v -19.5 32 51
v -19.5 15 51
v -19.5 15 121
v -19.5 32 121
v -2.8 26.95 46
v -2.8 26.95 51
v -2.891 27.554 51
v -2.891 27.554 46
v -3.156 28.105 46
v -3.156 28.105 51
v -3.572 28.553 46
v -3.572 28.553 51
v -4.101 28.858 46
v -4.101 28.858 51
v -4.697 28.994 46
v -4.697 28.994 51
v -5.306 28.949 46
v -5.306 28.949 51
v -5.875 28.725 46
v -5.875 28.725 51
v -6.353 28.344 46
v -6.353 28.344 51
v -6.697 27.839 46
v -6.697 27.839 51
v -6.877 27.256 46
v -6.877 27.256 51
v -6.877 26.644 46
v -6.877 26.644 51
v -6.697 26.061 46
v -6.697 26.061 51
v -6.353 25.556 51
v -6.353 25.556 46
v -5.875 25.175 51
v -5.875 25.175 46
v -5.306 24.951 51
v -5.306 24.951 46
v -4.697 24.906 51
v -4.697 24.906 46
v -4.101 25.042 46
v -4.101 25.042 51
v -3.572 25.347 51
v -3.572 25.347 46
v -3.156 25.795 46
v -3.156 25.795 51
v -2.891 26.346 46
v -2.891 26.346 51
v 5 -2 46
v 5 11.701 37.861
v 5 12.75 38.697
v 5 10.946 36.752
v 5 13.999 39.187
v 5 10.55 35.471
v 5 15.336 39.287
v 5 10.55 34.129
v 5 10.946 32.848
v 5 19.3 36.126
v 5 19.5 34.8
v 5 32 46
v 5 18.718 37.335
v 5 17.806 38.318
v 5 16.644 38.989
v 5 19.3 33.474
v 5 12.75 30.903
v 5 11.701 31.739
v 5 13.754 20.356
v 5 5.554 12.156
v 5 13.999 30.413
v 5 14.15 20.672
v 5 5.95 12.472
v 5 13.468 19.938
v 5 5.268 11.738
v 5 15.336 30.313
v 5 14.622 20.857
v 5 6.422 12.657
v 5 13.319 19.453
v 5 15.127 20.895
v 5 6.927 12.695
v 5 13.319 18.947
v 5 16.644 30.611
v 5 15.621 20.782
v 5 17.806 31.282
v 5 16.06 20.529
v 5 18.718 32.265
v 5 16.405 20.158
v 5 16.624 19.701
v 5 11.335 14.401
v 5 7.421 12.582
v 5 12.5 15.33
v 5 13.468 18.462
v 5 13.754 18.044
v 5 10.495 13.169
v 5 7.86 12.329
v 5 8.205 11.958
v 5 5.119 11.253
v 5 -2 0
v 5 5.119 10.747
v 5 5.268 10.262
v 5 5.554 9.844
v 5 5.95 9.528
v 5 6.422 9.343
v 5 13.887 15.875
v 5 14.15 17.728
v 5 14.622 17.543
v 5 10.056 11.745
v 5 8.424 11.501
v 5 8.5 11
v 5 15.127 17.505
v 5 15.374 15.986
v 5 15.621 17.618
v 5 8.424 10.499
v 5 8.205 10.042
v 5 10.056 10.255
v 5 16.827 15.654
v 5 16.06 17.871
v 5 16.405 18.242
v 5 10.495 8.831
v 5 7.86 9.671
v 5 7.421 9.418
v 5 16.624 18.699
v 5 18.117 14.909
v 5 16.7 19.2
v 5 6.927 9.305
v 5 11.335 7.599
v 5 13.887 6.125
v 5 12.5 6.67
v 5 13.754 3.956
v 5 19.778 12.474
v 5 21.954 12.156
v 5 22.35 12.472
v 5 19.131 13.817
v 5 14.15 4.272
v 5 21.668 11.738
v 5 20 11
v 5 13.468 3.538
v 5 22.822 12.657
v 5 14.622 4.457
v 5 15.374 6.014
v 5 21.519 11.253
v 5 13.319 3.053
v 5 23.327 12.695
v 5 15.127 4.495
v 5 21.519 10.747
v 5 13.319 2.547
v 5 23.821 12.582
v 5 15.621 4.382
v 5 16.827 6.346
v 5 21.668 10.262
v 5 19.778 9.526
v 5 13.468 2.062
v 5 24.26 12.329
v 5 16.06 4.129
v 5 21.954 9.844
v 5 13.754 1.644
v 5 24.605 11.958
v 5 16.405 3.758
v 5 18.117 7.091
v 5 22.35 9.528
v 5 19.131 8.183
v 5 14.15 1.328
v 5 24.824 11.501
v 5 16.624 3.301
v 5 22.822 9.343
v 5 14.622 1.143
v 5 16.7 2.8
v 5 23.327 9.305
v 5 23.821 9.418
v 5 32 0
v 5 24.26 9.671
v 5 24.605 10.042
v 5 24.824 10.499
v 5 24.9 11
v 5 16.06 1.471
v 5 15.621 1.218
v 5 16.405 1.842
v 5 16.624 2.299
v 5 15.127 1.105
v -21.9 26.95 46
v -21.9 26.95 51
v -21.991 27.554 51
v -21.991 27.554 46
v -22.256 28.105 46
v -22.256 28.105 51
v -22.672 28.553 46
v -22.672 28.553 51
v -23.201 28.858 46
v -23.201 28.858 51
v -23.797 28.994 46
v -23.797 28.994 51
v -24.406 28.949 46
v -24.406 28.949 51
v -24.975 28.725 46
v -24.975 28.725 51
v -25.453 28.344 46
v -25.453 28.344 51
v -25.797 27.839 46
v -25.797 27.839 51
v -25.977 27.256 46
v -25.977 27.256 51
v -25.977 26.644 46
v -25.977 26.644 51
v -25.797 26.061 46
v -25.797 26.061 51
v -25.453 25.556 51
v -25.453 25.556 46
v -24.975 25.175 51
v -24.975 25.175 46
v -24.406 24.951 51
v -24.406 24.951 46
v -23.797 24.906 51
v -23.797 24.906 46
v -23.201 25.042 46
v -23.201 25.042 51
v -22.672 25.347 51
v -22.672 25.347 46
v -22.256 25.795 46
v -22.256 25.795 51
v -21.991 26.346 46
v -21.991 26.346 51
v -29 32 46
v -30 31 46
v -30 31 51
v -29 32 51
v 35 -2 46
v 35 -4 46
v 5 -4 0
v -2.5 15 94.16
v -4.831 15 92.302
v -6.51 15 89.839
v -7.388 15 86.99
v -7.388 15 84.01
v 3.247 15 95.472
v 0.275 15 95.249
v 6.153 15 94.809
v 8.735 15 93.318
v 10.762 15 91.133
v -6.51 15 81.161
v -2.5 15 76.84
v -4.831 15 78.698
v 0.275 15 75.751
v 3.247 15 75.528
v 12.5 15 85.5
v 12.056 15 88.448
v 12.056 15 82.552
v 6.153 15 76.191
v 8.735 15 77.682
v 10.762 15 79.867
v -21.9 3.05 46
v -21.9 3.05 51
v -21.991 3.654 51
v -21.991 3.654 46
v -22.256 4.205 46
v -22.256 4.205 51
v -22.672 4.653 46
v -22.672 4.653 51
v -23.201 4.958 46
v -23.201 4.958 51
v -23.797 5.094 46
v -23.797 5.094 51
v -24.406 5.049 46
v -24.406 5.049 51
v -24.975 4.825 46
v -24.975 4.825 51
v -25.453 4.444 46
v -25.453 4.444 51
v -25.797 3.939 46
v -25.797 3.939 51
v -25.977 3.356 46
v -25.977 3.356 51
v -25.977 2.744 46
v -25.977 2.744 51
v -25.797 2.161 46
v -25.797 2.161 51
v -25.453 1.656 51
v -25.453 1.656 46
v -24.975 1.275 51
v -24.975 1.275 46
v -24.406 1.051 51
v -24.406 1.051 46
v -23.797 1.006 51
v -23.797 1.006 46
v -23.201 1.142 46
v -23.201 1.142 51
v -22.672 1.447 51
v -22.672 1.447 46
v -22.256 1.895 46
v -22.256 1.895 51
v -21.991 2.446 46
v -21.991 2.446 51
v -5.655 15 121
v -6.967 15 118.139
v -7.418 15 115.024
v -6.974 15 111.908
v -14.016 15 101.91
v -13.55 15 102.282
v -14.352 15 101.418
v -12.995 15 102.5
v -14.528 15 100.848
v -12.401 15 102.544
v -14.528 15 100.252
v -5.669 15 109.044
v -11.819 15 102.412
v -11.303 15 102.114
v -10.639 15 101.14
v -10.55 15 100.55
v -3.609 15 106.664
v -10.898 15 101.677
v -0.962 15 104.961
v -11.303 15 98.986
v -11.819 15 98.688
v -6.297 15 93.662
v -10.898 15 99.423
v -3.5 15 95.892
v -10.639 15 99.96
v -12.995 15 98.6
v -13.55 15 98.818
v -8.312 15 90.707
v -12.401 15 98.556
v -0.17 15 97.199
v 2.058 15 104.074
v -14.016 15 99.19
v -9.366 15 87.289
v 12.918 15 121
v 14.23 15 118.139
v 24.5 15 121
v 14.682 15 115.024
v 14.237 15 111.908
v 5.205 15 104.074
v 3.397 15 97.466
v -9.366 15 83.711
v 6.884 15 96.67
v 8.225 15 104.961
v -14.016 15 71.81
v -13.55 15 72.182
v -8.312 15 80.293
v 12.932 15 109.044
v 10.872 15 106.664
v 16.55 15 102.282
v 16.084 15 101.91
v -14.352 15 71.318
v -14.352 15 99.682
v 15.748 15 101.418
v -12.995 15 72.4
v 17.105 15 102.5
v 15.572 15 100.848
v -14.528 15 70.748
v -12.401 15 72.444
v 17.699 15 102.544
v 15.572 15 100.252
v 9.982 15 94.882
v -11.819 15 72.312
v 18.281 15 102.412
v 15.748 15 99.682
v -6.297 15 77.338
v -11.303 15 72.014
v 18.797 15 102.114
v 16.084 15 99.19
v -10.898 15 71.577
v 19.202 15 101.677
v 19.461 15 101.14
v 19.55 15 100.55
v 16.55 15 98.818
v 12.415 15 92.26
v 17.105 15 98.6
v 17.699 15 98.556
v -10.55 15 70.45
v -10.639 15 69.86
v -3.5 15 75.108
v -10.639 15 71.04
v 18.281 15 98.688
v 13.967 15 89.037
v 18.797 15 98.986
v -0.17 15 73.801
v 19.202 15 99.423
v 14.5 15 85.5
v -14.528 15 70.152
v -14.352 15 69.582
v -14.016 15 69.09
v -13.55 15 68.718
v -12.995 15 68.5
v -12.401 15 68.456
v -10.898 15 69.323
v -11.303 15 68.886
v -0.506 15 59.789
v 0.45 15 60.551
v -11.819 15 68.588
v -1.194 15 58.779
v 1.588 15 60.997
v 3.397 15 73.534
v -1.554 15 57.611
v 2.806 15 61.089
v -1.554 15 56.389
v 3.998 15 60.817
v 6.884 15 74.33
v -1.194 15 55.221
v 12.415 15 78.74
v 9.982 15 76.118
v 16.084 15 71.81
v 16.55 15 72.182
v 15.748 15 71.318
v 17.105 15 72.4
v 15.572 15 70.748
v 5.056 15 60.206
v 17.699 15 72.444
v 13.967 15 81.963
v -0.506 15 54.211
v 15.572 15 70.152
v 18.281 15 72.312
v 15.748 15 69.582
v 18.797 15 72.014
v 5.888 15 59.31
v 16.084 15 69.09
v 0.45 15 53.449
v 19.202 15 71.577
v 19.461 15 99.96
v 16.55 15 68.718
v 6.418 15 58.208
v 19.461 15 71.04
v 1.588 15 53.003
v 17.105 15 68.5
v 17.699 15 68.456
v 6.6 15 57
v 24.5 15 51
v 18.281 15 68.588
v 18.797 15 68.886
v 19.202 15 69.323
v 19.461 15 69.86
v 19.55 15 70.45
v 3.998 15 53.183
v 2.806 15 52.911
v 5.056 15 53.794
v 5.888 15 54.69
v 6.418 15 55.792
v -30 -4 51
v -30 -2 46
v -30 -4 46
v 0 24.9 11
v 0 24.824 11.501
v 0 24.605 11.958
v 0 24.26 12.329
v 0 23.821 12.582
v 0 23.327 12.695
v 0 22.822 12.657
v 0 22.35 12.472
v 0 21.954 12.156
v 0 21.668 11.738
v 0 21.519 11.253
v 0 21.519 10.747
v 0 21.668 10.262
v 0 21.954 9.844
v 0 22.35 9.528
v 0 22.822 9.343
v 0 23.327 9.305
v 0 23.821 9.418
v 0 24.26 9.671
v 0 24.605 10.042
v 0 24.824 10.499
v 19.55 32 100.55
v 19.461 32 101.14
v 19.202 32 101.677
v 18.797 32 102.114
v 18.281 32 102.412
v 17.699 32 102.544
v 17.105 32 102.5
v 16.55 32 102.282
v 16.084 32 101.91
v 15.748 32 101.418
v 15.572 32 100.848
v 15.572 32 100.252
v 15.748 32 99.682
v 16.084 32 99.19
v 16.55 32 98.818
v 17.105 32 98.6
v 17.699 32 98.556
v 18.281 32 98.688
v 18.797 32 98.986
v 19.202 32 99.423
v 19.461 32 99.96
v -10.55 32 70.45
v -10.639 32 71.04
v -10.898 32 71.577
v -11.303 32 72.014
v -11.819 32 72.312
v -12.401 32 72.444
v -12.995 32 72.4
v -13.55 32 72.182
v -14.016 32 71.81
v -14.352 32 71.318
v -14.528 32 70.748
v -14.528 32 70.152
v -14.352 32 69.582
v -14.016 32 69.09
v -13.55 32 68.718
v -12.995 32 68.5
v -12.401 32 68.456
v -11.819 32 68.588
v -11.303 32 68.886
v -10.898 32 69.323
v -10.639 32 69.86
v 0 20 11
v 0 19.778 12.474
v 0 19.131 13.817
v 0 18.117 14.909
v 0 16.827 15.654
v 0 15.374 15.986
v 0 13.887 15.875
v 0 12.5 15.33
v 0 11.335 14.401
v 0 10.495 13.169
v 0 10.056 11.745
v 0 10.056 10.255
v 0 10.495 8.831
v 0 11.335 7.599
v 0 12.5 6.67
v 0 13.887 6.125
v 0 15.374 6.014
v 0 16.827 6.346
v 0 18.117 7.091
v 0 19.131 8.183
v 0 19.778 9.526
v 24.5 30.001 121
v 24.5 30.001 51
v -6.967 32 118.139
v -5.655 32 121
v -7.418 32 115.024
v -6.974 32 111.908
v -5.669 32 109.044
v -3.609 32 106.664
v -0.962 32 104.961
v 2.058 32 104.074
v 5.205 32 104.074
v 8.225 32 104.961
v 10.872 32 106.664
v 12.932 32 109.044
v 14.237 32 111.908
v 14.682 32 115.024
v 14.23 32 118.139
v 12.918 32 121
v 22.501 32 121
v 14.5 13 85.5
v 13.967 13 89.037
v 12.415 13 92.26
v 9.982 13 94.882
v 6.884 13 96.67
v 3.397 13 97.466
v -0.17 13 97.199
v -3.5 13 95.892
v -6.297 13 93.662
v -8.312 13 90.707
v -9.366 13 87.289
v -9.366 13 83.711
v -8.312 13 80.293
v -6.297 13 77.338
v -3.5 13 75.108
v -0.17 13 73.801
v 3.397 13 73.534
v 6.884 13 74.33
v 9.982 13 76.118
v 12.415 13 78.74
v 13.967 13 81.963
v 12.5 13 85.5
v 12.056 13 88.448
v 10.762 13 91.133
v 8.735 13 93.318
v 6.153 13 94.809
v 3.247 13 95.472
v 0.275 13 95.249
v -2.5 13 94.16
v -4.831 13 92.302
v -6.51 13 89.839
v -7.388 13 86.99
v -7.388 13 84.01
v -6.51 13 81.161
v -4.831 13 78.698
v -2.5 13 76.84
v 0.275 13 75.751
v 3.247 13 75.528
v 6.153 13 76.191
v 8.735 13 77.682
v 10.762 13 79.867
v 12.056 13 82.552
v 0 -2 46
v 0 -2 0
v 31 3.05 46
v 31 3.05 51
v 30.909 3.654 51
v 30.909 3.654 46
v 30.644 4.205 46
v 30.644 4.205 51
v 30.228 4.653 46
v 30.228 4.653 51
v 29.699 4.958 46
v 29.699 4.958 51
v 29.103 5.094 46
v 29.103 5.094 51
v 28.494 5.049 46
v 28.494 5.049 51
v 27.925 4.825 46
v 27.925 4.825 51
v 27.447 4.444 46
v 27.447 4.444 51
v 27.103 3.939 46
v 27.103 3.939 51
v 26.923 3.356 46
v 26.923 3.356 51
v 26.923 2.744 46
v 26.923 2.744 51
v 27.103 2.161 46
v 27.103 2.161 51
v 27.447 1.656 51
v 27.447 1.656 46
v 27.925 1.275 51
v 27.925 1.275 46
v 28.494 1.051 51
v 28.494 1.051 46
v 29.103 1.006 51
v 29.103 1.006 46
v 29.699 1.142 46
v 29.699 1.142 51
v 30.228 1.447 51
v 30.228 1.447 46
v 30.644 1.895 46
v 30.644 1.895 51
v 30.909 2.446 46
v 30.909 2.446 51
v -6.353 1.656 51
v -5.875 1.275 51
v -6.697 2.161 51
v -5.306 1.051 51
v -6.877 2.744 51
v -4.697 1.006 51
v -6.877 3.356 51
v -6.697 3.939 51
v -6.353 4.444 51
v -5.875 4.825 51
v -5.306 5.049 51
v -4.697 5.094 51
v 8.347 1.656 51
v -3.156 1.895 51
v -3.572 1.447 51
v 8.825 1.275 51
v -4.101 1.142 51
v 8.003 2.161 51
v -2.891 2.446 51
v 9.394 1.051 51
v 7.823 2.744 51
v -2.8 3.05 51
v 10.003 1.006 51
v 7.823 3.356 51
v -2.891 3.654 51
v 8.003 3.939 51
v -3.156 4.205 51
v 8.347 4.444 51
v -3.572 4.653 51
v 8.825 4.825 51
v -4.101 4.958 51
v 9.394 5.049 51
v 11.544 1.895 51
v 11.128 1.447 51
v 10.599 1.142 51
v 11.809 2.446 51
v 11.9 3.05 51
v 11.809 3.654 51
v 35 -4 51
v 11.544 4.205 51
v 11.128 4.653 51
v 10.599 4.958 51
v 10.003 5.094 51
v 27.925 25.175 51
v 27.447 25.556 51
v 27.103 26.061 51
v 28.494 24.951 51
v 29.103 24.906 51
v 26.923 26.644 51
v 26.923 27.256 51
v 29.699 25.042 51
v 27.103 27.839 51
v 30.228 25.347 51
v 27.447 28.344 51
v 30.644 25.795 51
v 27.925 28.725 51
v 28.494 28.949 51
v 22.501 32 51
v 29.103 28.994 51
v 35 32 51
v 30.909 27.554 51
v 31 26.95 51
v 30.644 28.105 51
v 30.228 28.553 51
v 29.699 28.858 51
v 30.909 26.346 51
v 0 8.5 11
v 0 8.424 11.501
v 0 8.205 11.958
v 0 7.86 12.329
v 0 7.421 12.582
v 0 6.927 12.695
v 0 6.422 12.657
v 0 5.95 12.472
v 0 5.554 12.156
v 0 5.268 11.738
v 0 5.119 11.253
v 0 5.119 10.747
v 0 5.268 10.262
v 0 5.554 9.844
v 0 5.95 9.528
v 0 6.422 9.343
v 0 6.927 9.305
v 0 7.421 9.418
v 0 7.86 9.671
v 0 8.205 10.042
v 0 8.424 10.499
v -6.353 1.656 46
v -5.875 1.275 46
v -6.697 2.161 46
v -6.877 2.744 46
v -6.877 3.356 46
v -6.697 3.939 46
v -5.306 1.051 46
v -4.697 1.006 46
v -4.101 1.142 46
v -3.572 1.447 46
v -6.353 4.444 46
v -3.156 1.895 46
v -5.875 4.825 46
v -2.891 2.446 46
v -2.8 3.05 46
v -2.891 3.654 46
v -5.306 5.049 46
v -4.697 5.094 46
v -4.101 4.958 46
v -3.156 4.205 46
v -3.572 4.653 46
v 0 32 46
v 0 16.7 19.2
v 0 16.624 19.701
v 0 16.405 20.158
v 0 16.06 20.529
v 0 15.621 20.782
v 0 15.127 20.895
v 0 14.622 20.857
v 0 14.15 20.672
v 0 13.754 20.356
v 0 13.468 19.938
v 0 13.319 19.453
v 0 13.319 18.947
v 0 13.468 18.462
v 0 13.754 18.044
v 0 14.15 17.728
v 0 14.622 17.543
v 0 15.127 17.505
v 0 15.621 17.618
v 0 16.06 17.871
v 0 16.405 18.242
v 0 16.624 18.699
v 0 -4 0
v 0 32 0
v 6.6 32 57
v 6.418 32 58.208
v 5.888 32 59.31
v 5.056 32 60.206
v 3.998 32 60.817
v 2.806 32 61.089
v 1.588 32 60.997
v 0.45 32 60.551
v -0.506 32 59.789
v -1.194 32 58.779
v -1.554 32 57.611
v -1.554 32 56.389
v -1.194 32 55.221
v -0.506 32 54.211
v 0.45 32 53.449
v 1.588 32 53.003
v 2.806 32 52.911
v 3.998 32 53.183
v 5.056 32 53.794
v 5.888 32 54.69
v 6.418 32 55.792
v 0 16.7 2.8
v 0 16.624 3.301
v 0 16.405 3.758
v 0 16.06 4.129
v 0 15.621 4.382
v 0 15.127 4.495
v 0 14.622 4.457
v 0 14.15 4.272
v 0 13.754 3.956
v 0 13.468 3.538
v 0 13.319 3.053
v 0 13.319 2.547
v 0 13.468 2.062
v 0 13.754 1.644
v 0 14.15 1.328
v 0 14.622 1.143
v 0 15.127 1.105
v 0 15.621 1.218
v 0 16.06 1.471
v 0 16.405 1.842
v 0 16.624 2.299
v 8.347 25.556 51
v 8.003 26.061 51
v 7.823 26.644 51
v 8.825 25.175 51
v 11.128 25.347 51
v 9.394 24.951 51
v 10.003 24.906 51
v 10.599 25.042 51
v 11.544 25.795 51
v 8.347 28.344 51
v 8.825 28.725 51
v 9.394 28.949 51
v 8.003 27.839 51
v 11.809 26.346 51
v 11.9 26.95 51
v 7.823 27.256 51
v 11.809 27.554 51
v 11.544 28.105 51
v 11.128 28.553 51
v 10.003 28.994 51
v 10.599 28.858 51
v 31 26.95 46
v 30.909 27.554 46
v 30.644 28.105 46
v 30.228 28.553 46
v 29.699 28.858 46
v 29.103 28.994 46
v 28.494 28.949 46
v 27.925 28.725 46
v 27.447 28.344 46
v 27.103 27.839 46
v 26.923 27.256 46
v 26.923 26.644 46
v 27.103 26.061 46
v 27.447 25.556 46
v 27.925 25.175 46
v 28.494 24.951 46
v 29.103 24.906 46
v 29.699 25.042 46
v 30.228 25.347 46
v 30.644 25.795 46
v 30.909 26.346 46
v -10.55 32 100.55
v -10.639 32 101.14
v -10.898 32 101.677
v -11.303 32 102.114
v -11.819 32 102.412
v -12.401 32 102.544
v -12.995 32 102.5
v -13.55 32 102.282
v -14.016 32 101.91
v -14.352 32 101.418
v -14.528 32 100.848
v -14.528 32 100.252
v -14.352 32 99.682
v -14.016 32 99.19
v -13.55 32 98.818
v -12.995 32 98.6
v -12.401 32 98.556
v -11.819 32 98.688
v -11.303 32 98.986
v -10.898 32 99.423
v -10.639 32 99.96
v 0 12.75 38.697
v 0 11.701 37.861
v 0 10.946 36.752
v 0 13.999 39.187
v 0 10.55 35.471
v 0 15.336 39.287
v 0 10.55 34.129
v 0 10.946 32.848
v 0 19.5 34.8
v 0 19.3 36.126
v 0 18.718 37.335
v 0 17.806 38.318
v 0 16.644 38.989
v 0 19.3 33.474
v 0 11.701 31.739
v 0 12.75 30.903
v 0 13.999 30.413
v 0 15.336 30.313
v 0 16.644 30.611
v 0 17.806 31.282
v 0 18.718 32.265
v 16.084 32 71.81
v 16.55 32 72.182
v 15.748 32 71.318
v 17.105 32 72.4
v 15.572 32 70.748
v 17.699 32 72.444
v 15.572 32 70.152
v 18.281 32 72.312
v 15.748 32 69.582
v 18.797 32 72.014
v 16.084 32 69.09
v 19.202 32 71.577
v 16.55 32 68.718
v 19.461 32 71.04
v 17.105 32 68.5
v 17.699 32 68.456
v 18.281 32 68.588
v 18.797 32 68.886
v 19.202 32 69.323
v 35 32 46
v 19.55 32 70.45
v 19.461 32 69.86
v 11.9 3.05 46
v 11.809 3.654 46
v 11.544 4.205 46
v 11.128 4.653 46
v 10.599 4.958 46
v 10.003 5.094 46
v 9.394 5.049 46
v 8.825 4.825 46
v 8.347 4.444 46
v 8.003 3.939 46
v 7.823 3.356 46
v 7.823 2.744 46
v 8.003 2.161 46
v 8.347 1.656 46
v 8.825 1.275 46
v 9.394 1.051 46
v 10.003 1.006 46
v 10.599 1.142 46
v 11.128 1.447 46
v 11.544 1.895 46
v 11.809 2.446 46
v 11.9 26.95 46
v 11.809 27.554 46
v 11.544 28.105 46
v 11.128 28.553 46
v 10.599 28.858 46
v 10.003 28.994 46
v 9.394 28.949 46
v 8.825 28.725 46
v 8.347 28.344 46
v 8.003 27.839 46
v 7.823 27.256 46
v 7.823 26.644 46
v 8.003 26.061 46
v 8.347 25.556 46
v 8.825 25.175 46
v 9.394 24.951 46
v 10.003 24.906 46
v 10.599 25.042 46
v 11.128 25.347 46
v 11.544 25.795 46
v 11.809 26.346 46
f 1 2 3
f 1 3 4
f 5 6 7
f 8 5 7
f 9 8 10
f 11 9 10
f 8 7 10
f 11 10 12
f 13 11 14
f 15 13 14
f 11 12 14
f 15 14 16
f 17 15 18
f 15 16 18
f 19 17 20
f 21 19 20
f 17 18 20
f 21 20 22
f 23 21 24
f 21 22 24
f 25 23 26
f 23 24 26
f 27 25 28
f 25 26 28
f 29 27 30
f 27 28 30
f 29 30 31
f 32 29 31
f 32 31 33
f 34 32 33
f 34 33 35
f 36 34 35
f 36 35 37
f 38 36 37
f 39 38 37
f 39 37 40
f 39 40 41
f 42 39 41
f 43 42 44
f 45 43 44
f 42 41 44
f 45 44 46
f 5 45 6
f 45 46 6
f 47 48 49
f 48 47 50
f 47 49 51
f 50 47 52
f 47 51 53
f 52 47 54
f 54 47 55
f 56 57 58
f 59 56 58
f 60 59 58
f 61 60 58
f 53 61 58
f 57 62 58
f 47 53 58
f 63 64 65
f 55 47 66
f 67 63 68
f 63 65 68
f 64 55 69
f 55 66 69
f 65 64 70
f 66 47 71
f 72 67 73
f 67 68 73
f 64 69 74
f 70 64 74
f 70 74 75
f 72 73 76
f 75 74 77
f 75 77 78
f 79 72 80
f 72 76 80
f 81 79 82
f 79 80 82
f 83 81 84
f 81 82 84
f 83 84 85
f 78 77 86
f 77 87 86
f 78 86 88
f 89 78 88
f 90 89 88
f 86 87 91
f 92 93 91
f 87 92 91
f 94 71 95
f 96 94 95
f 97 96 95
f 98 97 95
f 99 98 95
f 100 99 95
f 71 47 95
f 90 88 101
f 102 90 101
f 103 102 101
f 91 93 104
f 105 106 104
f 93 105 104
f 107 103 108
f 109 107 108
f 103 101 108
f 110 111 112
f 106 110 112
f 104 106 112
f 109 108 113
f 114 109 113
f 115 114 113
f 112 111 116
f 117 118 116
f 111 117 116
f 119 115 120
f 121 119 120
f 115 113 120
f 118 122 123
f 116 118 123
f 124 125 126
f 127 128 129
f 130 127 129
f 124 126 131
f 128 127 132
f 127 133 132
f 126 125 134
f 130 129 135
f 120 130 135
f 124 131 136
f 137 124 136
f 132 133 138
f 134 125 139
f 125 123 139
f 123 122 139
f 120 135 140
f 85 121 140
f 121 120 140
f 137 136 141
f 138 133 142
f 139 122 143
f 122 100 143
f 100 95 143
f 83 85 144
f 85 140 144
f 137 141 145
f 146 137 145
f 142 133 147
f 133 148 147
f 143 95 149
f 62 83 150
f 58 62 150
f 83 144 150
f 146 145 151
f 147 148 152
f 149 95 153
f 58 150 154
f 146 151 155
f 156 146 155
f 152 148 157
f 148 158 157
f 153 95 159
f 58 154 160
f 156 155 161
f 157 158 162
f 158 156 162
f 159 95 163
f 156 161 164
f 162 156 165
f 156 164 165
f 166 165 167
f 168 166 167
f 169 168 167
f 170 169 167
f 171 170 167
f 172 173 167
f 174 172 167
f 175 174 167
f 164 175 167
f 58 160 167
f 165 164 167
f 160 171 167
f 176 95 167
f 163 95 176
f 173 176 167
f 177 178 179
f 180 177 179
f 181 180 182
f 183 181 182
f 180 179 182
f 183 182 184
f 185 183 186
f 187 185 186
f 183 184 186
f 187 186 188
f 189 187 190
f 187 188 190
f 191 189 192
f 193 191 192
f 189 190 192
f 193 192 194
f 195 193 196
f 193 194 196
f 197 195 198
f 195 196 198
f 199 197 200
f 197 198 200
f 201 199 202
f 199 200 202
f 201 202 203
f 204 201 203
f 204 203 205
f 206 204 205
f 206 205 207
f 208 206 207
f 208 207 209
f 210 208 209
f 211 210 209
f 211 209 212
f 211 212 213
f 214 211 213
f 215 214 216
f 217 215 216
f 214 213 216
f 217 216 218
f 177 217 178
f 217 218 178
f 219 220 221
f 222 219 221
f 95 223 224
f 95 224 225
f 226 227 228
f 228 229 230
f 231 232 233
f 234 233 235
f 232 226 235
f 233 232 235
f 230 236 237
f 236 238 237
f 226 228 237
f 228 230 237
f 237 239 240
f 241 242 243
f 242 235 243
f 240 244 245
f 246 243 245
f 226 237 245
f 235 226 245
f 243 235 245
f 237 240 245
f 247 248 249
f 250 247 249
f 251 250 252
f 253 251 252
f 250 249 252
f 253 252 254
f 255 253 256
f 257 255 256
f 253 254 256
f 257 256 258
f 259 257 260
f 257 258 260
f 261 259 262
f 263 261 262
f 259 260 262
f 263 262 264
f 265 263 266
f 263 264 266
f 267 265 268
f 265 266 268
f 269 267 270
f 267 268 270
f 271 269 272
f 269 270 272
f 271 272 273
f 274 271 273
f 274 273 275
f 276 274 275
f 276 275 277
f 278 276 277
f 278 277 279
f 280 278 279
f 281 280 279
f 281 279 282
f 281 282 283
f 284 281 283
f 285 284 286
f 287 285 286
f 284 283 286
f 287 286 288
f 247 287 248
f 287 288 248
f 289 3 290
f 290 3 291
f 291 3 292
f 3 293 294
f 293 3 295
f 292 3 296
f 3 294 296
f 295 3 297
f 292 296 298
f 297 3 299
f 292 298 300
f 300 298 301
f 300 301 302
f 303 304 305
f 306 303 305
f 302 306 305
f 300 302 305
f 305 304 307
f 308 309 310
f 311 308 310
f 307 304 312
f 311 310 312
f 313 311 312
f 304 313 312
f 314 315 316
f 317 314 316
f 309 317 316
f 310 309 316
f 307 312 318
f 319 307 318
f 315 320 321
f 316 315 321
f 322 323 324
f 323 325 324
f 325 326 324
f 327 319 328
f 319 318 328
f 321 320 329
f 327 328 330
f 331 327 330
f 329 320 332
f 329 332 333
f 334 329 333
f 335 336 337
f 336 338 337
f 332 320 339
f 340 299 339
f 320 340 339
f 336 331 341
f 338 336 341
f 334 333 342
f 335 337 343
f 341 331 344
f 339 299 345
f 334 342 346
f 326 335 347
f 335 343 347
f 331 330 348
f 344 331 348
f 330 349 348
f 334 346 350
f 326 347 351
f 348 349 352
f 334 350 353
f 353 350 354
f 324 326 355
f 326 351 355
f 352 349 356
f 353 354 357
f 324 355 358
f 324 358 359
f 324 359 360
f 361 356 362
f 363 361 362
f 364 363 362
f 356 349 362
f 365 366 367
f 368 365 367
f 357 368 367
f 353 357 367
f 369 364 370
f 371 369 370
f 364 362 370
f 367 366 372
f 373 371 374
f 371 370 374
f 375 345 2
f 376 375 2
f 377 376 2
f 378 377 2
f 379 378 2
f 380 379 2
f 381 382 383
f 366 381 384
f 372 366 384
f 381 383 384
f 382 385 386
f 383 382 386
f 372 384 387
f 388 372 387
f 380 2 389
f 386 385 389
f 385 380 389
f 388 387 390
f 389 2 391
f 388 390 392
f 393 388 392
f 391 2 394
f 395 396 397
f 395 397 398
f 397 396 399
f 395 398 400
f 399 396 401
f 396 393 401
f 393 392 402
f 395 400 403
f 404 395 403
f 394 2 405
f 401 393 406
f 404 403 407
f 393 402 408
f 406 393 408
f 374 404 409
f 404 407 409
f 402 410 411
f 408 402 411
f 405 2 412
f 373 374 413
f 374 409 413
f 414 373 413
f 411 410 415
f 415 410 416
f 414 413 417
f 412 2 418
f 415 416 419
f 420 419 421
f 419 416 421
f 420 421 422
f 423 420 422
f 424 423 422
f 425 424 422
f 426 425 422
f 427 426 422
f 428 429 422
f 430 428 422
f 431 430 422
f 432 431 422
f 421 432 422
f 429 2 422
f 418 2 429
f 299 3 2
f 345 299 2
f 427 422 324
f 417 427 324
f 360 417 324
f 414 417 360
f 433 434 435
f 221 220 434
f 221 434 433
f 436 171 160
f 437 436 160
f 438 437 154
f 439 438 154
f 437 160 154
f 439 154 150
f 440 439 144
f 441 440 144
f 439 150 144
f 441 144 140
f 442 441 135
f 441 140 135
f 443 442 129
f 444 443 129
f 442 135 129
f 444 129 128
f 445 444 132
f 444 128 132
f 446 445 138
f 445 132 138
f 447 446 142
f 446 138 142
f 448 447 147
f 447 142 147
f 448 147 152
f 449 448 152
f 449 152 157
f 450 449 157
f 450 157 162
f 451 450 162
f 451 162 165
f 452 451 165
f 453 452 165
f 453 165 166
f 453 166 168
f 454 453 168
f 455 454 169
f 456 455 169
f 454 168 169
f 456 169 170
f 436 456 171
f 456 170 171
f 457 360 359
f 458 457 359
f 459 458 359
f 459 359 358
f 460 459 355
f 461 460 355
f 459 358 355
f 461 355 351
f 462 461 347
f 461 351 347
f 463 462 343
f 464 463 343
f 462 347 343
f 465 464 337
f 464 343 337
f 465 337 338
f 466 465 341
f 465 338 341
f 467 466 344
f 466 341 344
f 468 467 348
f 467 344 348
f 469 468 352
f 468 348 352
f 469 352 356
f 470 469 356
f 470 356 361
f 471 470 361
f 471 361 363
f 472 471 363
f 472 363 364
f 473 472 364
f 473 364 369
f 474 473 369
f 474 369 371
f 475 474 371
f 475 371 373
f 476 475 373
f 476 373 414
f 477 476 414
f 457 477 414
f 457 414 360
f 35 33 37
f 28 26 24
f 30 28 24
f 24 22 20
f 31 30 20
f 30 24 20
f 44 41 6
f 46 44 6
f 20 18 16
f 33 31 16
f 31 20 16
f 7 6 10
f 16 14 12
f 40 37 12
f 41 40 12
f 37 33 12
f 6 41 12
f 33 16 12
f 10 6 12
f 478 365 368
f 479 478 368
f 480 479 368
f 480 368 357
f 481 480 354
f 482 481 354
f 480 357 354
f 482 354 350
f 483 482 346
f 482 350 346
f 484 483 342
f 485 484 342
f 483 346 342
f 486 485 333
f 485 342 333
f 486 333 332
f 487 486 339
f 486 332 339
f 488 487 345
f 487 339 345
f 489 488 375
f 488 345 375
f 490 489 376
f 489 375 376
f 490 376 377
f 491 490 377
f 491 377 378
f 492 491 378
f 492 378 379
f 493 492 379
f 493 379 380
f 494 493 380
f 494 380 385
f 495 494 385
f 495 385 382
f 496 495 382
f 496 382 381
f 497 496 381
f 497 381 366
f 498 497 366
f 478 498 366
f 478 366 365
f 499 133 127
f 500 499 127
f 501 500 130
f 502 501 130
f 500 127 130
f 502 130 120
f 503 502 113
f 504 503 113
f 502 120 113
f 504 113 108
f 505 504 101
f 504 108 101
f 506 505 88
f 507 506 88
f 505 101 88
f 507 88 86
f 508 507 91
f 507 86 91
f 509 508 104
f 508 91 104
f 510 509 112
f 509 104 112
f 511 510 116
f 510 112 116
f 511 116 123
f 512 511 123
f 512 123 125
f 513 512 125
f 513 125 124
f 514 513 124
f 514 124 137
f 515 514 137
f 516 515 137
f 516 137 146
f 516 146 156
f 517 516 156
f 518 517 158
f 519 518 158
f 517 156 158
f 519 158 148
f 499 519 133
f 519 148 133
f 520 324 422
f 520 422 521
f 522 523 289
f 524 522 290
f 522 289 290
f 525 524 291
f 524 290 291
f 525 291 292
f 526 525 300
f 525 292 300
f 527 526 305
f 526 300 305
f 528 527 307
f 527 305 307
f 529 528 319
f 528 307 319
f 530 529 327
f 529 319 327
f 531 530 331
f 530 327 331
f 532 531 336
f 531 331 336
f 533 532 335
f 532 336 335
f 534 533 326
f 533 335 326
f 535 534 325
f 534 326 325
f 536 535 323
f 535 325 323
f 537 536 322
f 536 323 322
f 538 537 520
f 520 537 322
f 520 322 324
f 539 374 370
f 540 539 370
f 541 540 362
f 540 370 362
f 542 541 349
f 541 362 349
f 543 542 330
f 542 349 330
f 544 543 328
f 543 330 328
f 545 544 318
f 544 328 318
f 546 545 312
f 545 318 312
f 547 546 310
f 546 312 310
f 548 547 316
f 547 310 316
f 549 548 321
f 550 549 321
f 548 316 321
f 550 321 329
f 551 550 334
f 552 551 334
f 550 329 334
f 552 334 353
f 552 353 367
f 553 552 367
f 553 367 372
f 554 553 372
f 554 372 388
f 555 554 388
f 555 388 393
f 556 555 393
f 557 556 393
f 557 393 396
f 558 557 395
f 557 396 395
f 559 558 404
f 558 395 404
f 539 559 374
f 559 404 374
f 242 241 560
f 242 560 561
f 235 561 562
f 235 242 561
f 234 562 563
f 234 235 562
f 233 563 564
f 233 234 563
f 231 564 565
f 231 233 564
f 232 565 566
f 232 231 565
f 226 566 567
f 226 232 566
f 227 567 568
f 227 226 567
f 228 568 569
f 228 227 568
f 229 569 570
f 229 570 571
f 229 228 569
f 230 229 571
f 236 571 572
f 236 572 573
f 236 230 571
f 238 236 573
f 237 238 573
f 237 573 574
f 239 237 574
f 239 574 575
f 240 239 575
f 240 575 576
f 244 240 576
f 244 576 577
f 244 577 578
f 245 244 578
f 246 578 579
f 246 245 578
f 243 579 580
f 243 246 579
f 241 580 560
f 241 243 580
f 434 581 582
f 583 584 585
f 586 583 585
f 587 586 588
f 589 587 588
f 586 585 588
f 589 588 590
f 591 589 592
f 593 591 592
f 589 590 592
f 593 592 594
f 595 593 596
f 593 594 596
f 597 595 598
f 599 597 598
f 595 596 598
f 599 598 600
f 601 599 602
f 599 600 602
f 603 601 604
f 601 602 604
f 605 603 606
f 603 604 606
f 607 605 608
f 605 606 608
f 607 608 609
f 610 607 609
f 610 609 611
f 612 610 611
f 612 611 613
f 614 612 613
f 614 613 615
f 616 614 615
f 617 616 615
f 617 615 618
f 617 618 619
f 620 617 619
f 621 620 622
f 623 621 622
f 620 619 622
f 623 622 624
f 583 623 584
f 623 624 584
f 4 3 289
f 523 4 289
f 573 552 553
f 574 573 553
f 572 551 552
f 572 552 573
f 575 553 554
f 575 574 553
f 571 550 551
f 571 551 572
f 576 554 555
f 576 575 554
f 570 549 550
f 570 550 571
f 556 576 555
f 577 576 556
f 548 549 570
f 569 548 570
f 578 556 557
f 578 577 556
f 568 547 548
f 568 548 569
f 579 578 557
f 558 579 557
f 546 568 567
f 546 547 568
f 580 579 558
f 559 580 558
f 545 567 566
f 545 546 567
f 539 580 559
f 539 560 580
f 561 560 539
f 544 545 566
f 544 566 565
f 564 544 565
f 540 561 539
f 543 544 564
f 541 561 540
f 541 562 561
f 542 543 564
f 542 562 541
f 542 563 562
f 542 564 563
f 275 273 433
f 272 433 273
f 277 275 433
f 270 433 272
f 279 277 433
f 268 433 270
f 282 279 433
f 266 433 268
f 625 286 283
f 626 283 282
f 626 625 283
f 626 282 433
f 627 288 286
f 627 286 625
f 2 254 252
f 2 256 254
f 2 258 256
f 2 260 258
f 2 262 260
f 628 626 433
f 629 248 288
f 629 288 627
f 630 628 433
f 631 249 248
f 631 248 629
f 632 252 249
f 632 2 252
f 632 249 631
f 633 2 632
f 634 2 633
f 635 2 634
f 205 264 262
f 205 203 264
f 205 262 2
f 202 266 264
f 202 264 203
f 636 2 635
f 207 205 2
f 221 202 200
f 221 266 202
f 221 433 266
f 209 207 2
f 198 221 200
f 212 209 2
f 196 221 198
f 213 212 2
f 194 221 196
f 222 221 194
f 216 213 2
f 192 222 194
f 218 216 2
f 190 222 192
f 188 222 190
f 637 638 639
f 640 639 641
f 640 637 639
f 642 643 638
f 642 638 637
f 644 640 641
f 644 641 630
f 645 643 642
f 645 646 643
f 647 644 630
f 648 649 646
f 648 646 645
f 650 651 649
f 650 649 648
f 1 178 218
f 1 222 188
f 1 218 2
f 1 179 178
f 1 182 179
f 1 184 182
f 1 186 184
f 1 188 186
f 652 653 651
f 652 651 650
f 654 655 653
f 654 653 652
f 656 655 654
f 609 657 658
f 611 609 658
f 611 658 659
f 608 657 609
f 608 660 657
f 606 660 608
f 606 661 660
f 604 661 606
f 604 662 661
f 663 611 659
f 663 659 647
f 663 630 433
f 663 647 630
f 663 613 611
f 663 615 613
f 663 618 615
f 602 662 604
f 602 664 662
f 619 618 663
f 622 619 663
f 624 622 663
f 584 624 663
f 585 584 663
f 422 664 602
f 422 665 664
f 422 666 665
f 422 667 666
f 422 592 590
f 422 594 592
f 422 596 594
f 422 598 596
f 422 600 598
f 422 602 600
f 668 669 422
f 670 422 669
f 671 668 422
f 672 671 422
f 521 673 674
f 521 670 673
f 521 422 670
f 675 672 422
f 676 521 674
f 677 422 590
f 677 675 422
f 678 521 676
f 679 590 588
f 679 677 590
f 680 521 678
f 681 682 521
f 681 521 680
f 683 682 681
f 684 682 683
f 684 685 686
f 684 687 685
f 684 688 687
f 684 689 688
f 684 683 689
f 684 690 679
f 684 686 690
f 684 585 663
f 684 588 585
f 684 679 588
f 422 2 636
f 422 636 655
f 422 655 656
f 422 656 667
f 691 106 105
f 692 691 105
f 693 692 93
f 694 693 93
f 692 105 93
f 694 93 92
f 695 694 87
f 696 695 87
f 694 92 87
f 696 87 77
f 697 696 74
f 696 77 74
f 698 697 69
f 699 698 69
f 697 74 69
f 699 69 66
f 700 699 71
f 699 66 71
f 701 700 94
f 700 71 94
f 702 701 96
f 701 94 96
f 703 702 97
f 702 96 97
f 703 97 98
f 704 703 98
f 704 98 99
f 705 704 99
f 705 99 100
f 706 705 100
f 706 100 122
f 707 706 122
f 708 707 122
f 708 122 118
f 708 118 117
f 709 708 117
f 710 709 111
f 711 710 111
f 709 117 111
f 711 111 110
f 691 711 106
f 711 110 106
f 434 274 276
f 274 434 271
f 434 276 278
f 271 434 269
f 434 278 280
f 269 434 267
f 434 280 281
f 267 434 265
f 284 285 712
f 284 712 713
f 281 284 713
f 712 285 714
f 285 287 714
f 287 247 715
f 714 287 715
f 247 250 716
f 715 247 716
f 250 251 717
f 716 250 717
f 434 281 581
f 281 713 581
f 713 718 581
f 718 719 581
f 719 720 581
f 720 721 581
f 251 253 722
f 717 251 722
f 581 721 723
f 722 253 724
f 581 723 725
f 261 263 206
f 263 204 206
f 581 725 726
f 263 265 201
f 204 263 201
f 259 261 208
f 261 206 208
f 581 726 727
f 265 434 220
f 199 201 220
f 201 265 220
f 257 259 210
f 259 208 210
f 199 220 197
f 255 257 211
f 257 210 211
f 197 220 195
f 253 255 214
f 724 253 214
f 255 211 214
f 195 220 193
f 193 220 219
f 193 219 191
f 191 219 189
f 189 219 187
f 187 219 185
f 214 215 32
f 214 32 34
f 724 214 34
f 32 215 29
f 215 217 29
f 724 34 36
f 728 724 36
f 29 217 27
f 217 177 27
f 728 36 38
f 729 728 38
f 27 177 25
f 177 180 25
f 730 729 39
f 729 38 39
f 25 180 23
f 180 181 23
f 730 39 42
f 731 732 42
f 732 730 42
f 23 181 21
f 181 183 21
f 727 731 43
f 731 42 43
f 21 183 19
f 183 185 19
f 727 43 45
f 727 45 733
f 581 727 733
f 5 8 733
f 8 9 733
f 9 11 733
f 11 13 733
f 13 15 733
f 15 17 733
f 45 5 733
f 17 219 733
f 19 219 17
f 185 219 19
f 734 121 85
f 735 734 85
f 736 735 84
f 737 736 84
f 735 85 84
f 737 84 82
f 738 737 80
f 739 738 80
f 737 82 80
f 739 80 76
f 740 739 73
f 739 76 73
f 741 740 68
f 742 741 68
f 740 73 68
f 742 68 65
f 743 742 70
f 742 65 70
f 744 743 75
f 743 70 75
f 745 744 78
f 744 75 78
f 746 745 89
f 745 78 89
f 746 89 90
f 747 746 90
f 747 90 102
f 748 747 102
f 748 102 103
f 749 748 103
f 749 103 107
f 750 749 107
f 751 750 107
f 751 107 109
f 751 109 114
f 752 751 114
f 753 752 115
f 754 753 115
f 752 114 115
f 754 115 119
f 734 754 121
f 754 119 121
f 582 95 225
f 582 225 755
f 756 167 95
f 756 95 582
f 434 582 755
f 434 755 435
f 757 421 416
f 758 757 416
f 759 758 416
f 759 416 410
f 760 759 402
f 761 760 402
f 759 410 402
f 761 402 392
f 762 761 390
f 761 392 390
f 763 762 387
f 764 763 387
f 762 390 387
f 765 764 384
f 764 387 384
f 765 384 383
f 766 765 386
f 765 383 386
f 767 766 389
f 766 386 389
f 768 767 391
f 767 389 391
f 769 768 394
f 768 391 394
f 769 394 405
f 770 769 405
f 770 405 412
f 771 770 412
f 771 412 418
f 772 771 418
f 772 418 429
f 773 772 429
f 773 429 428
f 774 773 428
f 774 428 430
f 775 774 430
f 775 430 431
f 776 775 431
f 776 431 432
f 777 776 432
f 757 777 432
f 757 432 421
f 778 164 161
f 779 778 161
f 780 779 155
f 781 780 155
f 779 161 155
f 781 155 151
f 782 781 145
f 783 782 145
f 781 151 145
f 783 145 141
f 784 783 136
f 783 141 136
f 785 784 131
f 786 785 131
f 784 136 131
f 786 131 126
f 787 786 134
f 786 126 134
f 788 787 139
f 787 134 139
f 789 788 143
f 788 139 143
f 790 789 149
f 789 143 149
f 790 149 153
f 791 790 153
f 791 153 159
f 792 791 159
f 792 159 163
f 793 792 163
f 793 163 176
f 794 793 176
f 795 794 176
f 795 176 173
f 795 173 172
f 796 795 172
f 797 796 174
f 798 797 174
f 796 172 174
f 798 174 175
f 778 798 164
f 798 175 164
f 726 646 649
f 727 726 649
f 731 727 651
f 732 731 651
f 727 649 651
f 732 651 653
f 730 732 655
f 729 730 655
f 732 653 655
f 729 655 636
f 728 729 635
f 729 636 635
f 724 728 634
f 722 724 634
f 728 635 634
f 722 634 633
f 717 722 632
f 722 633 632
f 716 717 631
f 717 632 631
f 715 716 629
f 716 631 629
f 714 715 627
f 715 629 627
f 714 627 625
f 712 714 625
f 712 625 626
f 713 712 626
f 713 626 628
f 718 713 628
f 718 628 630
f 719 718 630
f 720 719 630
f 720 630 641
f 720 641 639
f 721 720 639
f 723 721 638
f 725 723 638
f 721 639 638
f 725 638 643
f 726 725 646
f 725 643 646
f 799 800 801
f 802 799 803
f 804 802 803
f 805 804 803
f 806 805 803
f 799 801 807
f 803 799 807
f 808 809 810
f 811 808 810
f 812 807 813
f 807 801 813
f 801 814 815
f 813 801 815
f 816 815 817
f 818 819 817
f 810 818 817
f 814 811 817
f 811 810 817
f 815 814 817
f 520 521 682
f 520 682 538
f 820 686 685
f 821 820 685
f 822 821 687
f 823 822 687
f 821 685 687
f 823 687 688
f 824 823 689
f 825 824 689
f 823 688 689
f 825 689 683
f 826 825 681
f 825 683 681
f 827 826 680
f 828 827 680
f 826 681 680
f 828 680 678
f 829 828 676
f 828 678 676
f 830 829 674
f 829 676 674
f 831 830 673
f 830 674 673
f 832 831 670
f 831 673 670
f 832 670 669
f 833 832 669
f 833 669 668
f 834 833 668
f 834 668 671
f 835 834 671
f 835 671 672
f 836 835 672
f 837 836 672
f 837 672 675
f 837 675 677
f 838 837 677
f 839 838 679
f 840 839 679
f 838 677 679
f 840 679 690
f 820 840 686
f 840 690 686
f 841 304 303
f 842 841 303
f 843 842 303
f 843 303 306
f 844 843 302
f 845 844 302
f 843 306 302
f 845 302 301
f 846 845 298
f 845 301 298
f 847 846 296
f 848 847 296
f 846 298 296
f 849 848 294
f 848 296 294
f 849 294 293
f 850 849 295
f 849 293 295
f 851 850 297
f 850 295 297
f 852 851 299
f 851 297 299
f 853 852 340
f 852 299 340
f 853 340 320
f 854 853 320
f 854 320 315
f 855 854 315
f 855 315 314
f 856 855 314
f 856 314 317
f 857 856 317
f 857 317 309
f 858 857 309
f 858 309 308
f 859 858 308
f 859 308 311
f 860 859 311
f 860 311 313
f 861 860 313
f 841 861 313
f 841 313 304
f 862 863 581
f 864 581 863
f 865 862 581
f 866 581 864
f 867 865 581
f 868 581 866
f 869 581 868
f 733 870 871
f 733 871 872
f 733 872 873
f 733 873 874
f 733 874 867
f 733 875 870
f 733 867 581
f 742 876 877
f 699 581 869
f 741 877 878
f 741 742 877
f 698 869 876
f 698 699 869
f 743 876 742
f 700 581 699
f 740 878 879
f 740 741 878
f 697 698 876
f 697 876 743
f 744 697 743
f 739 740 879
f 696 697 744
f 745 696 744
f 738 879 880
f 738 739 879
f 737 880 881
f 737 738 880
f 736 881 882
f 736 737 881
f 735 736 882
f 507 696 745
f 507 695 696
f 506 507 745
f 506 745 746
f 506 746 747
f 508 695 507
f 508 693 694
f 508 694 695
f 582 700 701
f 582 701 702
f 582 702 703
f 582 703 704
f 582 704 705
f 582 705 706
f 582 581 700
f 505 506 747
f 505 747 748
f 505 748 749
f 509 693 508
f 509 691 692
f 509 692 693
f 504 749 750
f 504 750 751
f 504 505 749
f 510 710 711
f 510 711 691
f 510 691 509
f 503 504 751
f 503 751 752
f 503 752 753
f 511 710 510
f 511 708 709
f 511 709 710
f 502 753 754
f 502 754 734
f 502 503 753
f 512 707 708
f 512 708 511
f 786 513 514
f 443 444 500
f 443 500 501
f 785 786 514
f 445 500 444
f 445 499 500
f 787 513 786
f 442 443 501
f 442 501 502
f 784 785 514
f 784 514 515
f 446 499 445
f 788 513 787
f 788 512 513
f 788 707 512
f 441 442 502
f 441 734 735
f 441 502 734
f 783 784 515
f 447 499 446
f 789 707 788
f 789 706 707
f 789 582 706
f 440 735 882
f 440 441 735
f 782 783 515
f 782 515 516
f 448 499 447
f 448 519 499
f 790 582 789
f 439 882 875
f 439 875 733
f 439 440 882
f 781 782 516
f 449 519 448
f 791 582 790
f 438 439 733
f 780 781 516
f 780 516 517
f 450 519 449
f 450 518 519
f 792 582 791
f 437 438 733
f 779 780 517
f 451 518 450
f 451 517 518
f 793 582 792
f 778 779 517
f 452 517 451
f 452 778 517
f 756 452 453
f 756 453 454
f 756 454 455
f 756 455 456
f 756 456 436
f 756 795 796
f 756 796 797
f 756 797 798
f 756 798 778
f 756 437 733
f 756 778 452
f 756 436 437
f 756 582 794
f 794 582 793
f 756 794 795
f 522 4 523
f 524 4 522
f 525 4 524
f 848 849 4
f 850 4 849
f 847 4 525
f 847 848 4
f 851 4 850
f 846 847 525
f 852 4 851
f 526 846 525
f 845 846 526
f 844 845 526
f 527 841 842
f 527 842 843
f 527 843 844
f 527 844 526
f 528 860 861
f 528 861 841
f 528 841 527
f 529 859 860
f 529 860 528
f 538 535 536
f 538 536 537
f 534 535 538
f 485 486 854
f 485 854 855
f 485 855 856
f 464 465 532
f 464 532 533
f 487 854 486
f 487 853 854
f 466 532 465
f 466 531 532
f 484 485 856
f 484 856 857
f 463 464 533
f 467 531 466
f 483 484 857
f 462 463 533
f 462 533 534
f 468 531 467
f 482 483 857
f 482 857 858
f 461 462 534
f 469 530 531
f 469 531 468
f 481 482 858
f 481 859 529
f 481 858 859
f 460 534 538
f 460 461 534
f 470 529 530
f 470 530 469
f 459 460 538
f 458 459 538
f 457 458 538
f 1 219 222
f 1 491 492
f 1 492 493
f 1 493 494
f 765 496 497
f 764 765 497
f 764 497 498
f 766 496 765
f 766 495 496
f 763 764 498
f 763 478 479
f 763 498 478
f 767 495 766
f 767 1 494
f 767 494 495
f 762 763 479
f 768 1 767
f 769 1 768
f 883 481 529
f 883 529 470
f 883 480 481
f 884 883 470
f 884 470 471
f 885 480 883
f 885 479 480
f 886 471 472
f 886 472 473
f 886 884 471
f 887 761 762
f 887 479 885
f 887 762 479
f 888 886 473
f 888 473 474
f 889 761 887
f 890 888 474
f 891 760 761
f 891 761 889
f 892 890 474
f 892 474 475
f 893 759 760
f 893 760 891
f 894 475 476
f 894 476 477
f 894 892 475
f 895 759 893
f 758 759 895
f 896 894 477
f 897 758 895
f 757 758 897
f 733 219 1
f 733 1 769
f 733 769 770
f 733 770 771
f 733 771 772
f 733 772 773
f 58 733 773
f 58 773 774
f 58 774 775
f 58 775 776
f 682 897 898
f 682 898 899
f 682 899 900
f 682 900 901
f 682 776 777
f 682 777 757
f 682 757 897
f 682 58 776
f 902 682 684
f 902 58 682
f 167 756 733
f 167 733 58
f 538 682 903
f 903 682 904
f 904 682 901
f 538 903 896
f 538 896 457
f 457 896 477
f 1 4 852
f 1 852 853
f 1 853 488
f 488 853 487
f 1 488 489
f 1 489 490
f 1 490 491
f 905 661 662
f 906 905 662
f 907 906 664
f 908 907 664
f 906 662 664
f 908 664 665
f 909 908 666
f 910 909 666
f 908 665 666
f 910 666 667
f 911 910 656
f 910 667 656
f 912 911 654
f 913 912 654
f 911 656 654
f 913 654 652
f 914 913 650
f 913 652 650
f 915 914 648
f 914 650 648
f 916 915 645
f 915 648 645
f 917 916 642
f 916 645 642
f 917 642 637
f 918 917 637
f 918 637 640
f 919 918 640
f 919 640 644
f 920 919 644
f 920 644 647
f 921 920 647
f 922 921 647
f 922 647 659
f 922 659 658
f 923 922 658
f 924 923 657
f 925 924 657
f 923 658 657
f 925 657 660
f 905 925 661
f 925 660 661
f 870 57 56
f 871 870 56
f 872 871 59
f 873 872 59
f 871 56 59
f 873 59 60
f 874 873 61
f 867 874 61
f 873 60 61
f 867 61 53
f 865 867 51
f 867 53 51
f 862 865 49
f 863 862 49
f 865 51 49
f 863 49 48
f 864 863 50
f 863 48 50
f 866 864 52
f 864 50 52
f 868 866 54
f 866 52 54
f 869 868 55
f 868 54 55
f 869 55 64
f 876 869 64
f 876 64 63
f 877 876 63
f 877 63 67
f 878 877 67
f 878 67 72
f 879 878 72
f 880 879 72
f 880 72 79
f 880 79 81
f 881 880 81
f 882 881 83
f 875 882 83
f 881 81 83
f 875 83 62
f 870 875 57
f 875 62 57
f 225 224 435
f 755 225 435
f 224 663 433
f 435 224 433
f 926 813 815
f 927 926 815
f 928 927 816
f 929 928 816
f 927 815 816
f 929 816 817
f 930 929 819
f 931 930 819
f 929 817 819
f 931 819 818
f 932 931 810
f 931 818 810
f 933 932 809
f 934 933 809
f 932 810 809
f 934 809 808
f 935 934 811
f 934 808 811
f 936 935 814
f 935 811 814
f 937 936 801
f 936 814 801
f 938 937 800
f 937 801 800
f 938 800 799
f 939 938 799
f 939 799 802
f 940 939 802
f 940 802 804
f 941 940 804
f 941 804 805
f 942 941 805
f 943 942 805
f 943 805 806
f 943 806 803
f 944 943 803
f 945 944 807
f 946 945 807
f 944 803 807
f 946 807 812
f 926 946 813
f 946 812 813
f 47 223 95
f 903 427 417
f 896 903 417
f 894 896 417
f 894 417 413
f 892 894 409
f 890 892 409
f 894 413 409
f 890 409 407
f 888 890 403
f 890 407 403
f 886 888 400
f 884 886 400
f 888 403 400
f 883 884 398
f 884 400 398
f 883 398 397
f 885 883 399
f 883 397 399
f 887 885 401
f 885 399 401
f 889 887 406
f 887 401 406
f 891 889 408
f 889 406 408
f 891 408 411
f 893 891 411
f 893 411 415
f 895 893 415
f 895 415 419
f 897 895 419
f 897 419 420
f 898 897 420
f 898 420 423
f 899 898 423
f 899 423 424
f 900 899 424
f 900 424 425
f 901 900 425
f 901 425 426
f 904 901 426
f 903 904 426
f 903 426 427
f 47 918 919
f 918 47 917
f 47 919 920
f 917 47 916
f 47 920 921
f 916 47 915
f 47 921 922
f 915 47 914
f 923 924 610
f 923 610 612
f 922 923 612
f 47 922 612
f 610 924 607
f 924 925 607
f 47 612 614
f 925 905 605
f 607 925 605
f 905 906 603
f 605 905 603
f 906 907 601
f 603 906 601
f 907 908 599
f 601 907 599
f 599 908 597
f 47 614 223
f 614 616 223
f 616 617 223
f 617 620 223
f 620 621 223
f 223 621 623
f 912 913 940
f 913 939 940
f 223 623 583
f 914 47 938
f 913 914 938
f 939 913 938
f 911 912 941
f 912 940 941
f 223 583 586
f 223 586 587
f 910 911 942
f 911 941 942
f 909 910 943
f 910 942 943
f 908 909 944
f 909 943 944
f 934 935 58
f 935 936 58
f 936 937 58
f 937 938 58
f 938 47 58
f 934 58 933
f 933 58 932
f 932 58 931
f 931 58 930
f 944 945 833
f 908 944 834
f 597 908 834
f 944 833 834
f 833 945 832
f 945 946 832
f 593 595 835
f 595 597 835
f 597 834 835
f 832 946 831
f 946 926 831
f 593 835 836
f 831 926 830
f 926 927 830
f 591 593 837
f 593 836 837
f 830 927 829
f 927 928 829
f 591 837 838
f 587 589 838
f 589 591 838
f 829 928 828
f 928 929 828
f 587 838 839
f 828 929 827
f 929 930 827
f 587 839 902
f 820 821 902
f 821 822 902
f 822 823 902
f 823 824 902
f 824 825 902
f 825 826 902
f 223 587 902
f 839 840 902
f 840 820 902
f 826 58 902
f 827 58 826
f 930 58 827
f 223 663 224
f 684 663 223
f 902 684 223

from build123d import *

# Parameters (mm, degrees)
PAD_DEPTH       = 2
BOX002_W        = 44
BOX002_H        = 17
BOX002_DEPTH    = 78
SKETCH003_R     = 4.1
SKETCH003_R_2   = 2
SKETCH003_W     = 49.28004
SKETCH003_H     = 11.88092
POCKET003_DEPTH = 17.001
BOX001_W        = 65
BOX001_H        = 34
BOX001_DEPTH    = 5
BOX_W           = 5
BOX_H           = 34
BOX_DEPTH       = 46
SKETCH_R        = 2.05
POCKET_DEPTH    = 5
SKETCH001_R     = 5
SKETCH001_R_2   = 1.7
POCKET001_DEPTH = 5
SKETCH002_R     = 4.5
POCKET002_DEPTH = 5
SKETCH007_R     = 11.05
POCKET004_DEPTH = 17.001
SKETCH008_R     = 12
SKETCH008_R_2   = 10
PAD001_DEPTH    = 2
CHAMFER_SIZE    = 1
CHAMFER001_SIZE = 1.999


with BuildPart() as pad:
    # Sketch006 → Pad (new body)
    with BuildSketch(Plane.XZ.offset(2)):
        Polygon((-30, 51), (35, 51), (35, 46), (5, 0), (0, 0), (-30, 46), align=None)
    extrude(amount=PAD_DEPTH)


with BuildPart() as pocket003:
    # Box002 → Box002 (new body)
    with BuildSketch(Plane(origin=(-19.5, 15, 51), x_dir=(1, 0, 0), z_dir=(0, 0, 1))):
        with Locations((22, 8.5)):
            Rectangle(BOX002_W, BOX002_H)
    extrude(amount=BOX002_DEPTH)

    # Sketch003 → Pocket003 (cut, through all)
    with BuildSketch(Plane(origin=(-19.5, 15, 51), x_dir=(1, 0, 0), z_dir=(0, -1, 0))):
        with Locations((22, 6)):
            Circle(SKETCH003_R)
        with Locations((22, 63)):
            Circle(SKETCH003_R)
        with Locations((6.95, 19.45)):
            Circle(SKETCH003_R_2)
        with Locations((37.05, 19.45)):
            Circle(SKETCH003_R_2)
        with Locations((6.95, 49.55)):
            Circle(SKETCH003_R_2)
        with Locations((37.05, 49.55)):
            Circle(SKETCH003_R_2)
        with Locations((21.985447, 75.94046)):
            Rectangle(SKETCH003_W, SKETCH003_H)
    extrude(amount=-POCKET003_DEPTH, mode=Mode.SUBTRACT)


with BuildPart() as cubo001:
    # Box001 → Box001 (new body)
    with BuildSketch(Plane(origin=(-30, -2, 46), x_dir=(1, 0, 0), z_dir=(0, 0, 1))):
        with Locations((32.5, 17)):
            Rectangle(BOX001_W, BOX001_H)
    extrude(amount=BOX001_DEPTH)


with BuildPart() as chamfer001:
    # Box → Box (new body)
    with BuildSketch(Plane(origin=(0, -2, 0), x_dir=(1, 0, 0), z_dir=(0, 0, 1))):
        with Locations((2.5, 17)):
            Rectangle(BOX_W, BOX_H)
    extrude(amount=BOX_DEPTH)

    # Fusion: union Cubo001
    add(cubo001.part)

    # Sketch → Pocket (cut)
    with BuildSketch(Plane.XY.offset(51)):
        with Locations((-36.05, -7.05)):
            Circle(SKETCH_R)
        with Locations((28.95, 3.05)):
            Circle(SKETCH_R)
        with Locations((-55.15, -7.05)):
            Circle(SKETCH_R)
        with Locations((9.85, 3.05)):
            Circle(SKETCH_R)
        with Locations((-4.85, 3.05)):
            Circle(SKETCH_R)
        with Locations((-23.95, 3.05)):
            Circle(SKETCH_R)
        with Locations((-23.95, 26.95)):
            Circle(SKETCH_R)
        with Locations((-4.85, 26.95)):
            Circle(SKETCH_R)
        with Locations((9.85, 26.95)):
            Circle(SKETCH_R)
        with Locations((28.95, 26.95)):
            Circle(SKETCH_R)
    extrude(amount=-POCKET_DEPTH, mode=Mode.SUBTRACT)

    # Sketch001 → Pocket001 (cut)
    with BuildSketch(Plane.YZ.offset(5)):
        with Locations((15, 11)):
            Circle(SKETCH001_R)
        with Locations((15, 19.2)):
            Circle(SKETCH001_R_2)
        with Locations((23.2, 11)):
            Circle(SKETCH001_R_2)
        with Locations((15, 2.8)):
            Circle(SKETCH001_R_2)
        with Locations((6.8, 11)):
            Circle(SKETCH001_R_2)
    extrude(amount=-POCKET001_DEPTH, mode=Mode.SUBTRACT)

    # Sketch002 → Pocket002 (cut)
    with BuildSketch(Plane.YZ.offset(5)):
        with Locations((15, 34.8)):
            Circle(SKETCH002_R)
    extrude(amount=-POCKET002_DEPTH, mode=Mode.SUBTRACT)

    # Fusion001: union Pad, Pocket003
    add(pad.part)
    add(pocket003.part)

    # Sketch007 → Pocket004 (cut, through all)
    with BuildSketch(Plane.XZ.offset(-15)):
        with Locations((3.631613, 115.011309)):
            Circle(SKETCH007_R)
    extrude(amount=-POCKET004_DEPTH, mode=Mode.SUBTRACT)

    # Sketch008 → Pad001 (new body)
    with BuildSketch(Plane.XZ.offset(-15)):
        with Locations((2.5, 85.5)):
            Circle(SKETCH008_R)
        with Locations((2.5, 85.5)):
            Circle(SKETCH008_R_2, mode=Mode.SUBTRACT)
    extrude(amount=PAD001_DEPTH)

    # Chamfer
    chamfer_edges = [chamfer001.edges().sort_by_distance(p)[0] for p in [
        (-30, 32, 48.5),
    ]]
    chamfer(chamfer_edges, length=CHAMFER_SIZE)

    # Chamfer001
    chamfer001_edges = [chamfer001.edges().sort_by_distance(p)[0] for p in [
        (24.5, 32, 86),
    ]]
    chamfer(chamfer001_edges, length=CHAMFER001_SIZE)


solid = chamfer001.part
